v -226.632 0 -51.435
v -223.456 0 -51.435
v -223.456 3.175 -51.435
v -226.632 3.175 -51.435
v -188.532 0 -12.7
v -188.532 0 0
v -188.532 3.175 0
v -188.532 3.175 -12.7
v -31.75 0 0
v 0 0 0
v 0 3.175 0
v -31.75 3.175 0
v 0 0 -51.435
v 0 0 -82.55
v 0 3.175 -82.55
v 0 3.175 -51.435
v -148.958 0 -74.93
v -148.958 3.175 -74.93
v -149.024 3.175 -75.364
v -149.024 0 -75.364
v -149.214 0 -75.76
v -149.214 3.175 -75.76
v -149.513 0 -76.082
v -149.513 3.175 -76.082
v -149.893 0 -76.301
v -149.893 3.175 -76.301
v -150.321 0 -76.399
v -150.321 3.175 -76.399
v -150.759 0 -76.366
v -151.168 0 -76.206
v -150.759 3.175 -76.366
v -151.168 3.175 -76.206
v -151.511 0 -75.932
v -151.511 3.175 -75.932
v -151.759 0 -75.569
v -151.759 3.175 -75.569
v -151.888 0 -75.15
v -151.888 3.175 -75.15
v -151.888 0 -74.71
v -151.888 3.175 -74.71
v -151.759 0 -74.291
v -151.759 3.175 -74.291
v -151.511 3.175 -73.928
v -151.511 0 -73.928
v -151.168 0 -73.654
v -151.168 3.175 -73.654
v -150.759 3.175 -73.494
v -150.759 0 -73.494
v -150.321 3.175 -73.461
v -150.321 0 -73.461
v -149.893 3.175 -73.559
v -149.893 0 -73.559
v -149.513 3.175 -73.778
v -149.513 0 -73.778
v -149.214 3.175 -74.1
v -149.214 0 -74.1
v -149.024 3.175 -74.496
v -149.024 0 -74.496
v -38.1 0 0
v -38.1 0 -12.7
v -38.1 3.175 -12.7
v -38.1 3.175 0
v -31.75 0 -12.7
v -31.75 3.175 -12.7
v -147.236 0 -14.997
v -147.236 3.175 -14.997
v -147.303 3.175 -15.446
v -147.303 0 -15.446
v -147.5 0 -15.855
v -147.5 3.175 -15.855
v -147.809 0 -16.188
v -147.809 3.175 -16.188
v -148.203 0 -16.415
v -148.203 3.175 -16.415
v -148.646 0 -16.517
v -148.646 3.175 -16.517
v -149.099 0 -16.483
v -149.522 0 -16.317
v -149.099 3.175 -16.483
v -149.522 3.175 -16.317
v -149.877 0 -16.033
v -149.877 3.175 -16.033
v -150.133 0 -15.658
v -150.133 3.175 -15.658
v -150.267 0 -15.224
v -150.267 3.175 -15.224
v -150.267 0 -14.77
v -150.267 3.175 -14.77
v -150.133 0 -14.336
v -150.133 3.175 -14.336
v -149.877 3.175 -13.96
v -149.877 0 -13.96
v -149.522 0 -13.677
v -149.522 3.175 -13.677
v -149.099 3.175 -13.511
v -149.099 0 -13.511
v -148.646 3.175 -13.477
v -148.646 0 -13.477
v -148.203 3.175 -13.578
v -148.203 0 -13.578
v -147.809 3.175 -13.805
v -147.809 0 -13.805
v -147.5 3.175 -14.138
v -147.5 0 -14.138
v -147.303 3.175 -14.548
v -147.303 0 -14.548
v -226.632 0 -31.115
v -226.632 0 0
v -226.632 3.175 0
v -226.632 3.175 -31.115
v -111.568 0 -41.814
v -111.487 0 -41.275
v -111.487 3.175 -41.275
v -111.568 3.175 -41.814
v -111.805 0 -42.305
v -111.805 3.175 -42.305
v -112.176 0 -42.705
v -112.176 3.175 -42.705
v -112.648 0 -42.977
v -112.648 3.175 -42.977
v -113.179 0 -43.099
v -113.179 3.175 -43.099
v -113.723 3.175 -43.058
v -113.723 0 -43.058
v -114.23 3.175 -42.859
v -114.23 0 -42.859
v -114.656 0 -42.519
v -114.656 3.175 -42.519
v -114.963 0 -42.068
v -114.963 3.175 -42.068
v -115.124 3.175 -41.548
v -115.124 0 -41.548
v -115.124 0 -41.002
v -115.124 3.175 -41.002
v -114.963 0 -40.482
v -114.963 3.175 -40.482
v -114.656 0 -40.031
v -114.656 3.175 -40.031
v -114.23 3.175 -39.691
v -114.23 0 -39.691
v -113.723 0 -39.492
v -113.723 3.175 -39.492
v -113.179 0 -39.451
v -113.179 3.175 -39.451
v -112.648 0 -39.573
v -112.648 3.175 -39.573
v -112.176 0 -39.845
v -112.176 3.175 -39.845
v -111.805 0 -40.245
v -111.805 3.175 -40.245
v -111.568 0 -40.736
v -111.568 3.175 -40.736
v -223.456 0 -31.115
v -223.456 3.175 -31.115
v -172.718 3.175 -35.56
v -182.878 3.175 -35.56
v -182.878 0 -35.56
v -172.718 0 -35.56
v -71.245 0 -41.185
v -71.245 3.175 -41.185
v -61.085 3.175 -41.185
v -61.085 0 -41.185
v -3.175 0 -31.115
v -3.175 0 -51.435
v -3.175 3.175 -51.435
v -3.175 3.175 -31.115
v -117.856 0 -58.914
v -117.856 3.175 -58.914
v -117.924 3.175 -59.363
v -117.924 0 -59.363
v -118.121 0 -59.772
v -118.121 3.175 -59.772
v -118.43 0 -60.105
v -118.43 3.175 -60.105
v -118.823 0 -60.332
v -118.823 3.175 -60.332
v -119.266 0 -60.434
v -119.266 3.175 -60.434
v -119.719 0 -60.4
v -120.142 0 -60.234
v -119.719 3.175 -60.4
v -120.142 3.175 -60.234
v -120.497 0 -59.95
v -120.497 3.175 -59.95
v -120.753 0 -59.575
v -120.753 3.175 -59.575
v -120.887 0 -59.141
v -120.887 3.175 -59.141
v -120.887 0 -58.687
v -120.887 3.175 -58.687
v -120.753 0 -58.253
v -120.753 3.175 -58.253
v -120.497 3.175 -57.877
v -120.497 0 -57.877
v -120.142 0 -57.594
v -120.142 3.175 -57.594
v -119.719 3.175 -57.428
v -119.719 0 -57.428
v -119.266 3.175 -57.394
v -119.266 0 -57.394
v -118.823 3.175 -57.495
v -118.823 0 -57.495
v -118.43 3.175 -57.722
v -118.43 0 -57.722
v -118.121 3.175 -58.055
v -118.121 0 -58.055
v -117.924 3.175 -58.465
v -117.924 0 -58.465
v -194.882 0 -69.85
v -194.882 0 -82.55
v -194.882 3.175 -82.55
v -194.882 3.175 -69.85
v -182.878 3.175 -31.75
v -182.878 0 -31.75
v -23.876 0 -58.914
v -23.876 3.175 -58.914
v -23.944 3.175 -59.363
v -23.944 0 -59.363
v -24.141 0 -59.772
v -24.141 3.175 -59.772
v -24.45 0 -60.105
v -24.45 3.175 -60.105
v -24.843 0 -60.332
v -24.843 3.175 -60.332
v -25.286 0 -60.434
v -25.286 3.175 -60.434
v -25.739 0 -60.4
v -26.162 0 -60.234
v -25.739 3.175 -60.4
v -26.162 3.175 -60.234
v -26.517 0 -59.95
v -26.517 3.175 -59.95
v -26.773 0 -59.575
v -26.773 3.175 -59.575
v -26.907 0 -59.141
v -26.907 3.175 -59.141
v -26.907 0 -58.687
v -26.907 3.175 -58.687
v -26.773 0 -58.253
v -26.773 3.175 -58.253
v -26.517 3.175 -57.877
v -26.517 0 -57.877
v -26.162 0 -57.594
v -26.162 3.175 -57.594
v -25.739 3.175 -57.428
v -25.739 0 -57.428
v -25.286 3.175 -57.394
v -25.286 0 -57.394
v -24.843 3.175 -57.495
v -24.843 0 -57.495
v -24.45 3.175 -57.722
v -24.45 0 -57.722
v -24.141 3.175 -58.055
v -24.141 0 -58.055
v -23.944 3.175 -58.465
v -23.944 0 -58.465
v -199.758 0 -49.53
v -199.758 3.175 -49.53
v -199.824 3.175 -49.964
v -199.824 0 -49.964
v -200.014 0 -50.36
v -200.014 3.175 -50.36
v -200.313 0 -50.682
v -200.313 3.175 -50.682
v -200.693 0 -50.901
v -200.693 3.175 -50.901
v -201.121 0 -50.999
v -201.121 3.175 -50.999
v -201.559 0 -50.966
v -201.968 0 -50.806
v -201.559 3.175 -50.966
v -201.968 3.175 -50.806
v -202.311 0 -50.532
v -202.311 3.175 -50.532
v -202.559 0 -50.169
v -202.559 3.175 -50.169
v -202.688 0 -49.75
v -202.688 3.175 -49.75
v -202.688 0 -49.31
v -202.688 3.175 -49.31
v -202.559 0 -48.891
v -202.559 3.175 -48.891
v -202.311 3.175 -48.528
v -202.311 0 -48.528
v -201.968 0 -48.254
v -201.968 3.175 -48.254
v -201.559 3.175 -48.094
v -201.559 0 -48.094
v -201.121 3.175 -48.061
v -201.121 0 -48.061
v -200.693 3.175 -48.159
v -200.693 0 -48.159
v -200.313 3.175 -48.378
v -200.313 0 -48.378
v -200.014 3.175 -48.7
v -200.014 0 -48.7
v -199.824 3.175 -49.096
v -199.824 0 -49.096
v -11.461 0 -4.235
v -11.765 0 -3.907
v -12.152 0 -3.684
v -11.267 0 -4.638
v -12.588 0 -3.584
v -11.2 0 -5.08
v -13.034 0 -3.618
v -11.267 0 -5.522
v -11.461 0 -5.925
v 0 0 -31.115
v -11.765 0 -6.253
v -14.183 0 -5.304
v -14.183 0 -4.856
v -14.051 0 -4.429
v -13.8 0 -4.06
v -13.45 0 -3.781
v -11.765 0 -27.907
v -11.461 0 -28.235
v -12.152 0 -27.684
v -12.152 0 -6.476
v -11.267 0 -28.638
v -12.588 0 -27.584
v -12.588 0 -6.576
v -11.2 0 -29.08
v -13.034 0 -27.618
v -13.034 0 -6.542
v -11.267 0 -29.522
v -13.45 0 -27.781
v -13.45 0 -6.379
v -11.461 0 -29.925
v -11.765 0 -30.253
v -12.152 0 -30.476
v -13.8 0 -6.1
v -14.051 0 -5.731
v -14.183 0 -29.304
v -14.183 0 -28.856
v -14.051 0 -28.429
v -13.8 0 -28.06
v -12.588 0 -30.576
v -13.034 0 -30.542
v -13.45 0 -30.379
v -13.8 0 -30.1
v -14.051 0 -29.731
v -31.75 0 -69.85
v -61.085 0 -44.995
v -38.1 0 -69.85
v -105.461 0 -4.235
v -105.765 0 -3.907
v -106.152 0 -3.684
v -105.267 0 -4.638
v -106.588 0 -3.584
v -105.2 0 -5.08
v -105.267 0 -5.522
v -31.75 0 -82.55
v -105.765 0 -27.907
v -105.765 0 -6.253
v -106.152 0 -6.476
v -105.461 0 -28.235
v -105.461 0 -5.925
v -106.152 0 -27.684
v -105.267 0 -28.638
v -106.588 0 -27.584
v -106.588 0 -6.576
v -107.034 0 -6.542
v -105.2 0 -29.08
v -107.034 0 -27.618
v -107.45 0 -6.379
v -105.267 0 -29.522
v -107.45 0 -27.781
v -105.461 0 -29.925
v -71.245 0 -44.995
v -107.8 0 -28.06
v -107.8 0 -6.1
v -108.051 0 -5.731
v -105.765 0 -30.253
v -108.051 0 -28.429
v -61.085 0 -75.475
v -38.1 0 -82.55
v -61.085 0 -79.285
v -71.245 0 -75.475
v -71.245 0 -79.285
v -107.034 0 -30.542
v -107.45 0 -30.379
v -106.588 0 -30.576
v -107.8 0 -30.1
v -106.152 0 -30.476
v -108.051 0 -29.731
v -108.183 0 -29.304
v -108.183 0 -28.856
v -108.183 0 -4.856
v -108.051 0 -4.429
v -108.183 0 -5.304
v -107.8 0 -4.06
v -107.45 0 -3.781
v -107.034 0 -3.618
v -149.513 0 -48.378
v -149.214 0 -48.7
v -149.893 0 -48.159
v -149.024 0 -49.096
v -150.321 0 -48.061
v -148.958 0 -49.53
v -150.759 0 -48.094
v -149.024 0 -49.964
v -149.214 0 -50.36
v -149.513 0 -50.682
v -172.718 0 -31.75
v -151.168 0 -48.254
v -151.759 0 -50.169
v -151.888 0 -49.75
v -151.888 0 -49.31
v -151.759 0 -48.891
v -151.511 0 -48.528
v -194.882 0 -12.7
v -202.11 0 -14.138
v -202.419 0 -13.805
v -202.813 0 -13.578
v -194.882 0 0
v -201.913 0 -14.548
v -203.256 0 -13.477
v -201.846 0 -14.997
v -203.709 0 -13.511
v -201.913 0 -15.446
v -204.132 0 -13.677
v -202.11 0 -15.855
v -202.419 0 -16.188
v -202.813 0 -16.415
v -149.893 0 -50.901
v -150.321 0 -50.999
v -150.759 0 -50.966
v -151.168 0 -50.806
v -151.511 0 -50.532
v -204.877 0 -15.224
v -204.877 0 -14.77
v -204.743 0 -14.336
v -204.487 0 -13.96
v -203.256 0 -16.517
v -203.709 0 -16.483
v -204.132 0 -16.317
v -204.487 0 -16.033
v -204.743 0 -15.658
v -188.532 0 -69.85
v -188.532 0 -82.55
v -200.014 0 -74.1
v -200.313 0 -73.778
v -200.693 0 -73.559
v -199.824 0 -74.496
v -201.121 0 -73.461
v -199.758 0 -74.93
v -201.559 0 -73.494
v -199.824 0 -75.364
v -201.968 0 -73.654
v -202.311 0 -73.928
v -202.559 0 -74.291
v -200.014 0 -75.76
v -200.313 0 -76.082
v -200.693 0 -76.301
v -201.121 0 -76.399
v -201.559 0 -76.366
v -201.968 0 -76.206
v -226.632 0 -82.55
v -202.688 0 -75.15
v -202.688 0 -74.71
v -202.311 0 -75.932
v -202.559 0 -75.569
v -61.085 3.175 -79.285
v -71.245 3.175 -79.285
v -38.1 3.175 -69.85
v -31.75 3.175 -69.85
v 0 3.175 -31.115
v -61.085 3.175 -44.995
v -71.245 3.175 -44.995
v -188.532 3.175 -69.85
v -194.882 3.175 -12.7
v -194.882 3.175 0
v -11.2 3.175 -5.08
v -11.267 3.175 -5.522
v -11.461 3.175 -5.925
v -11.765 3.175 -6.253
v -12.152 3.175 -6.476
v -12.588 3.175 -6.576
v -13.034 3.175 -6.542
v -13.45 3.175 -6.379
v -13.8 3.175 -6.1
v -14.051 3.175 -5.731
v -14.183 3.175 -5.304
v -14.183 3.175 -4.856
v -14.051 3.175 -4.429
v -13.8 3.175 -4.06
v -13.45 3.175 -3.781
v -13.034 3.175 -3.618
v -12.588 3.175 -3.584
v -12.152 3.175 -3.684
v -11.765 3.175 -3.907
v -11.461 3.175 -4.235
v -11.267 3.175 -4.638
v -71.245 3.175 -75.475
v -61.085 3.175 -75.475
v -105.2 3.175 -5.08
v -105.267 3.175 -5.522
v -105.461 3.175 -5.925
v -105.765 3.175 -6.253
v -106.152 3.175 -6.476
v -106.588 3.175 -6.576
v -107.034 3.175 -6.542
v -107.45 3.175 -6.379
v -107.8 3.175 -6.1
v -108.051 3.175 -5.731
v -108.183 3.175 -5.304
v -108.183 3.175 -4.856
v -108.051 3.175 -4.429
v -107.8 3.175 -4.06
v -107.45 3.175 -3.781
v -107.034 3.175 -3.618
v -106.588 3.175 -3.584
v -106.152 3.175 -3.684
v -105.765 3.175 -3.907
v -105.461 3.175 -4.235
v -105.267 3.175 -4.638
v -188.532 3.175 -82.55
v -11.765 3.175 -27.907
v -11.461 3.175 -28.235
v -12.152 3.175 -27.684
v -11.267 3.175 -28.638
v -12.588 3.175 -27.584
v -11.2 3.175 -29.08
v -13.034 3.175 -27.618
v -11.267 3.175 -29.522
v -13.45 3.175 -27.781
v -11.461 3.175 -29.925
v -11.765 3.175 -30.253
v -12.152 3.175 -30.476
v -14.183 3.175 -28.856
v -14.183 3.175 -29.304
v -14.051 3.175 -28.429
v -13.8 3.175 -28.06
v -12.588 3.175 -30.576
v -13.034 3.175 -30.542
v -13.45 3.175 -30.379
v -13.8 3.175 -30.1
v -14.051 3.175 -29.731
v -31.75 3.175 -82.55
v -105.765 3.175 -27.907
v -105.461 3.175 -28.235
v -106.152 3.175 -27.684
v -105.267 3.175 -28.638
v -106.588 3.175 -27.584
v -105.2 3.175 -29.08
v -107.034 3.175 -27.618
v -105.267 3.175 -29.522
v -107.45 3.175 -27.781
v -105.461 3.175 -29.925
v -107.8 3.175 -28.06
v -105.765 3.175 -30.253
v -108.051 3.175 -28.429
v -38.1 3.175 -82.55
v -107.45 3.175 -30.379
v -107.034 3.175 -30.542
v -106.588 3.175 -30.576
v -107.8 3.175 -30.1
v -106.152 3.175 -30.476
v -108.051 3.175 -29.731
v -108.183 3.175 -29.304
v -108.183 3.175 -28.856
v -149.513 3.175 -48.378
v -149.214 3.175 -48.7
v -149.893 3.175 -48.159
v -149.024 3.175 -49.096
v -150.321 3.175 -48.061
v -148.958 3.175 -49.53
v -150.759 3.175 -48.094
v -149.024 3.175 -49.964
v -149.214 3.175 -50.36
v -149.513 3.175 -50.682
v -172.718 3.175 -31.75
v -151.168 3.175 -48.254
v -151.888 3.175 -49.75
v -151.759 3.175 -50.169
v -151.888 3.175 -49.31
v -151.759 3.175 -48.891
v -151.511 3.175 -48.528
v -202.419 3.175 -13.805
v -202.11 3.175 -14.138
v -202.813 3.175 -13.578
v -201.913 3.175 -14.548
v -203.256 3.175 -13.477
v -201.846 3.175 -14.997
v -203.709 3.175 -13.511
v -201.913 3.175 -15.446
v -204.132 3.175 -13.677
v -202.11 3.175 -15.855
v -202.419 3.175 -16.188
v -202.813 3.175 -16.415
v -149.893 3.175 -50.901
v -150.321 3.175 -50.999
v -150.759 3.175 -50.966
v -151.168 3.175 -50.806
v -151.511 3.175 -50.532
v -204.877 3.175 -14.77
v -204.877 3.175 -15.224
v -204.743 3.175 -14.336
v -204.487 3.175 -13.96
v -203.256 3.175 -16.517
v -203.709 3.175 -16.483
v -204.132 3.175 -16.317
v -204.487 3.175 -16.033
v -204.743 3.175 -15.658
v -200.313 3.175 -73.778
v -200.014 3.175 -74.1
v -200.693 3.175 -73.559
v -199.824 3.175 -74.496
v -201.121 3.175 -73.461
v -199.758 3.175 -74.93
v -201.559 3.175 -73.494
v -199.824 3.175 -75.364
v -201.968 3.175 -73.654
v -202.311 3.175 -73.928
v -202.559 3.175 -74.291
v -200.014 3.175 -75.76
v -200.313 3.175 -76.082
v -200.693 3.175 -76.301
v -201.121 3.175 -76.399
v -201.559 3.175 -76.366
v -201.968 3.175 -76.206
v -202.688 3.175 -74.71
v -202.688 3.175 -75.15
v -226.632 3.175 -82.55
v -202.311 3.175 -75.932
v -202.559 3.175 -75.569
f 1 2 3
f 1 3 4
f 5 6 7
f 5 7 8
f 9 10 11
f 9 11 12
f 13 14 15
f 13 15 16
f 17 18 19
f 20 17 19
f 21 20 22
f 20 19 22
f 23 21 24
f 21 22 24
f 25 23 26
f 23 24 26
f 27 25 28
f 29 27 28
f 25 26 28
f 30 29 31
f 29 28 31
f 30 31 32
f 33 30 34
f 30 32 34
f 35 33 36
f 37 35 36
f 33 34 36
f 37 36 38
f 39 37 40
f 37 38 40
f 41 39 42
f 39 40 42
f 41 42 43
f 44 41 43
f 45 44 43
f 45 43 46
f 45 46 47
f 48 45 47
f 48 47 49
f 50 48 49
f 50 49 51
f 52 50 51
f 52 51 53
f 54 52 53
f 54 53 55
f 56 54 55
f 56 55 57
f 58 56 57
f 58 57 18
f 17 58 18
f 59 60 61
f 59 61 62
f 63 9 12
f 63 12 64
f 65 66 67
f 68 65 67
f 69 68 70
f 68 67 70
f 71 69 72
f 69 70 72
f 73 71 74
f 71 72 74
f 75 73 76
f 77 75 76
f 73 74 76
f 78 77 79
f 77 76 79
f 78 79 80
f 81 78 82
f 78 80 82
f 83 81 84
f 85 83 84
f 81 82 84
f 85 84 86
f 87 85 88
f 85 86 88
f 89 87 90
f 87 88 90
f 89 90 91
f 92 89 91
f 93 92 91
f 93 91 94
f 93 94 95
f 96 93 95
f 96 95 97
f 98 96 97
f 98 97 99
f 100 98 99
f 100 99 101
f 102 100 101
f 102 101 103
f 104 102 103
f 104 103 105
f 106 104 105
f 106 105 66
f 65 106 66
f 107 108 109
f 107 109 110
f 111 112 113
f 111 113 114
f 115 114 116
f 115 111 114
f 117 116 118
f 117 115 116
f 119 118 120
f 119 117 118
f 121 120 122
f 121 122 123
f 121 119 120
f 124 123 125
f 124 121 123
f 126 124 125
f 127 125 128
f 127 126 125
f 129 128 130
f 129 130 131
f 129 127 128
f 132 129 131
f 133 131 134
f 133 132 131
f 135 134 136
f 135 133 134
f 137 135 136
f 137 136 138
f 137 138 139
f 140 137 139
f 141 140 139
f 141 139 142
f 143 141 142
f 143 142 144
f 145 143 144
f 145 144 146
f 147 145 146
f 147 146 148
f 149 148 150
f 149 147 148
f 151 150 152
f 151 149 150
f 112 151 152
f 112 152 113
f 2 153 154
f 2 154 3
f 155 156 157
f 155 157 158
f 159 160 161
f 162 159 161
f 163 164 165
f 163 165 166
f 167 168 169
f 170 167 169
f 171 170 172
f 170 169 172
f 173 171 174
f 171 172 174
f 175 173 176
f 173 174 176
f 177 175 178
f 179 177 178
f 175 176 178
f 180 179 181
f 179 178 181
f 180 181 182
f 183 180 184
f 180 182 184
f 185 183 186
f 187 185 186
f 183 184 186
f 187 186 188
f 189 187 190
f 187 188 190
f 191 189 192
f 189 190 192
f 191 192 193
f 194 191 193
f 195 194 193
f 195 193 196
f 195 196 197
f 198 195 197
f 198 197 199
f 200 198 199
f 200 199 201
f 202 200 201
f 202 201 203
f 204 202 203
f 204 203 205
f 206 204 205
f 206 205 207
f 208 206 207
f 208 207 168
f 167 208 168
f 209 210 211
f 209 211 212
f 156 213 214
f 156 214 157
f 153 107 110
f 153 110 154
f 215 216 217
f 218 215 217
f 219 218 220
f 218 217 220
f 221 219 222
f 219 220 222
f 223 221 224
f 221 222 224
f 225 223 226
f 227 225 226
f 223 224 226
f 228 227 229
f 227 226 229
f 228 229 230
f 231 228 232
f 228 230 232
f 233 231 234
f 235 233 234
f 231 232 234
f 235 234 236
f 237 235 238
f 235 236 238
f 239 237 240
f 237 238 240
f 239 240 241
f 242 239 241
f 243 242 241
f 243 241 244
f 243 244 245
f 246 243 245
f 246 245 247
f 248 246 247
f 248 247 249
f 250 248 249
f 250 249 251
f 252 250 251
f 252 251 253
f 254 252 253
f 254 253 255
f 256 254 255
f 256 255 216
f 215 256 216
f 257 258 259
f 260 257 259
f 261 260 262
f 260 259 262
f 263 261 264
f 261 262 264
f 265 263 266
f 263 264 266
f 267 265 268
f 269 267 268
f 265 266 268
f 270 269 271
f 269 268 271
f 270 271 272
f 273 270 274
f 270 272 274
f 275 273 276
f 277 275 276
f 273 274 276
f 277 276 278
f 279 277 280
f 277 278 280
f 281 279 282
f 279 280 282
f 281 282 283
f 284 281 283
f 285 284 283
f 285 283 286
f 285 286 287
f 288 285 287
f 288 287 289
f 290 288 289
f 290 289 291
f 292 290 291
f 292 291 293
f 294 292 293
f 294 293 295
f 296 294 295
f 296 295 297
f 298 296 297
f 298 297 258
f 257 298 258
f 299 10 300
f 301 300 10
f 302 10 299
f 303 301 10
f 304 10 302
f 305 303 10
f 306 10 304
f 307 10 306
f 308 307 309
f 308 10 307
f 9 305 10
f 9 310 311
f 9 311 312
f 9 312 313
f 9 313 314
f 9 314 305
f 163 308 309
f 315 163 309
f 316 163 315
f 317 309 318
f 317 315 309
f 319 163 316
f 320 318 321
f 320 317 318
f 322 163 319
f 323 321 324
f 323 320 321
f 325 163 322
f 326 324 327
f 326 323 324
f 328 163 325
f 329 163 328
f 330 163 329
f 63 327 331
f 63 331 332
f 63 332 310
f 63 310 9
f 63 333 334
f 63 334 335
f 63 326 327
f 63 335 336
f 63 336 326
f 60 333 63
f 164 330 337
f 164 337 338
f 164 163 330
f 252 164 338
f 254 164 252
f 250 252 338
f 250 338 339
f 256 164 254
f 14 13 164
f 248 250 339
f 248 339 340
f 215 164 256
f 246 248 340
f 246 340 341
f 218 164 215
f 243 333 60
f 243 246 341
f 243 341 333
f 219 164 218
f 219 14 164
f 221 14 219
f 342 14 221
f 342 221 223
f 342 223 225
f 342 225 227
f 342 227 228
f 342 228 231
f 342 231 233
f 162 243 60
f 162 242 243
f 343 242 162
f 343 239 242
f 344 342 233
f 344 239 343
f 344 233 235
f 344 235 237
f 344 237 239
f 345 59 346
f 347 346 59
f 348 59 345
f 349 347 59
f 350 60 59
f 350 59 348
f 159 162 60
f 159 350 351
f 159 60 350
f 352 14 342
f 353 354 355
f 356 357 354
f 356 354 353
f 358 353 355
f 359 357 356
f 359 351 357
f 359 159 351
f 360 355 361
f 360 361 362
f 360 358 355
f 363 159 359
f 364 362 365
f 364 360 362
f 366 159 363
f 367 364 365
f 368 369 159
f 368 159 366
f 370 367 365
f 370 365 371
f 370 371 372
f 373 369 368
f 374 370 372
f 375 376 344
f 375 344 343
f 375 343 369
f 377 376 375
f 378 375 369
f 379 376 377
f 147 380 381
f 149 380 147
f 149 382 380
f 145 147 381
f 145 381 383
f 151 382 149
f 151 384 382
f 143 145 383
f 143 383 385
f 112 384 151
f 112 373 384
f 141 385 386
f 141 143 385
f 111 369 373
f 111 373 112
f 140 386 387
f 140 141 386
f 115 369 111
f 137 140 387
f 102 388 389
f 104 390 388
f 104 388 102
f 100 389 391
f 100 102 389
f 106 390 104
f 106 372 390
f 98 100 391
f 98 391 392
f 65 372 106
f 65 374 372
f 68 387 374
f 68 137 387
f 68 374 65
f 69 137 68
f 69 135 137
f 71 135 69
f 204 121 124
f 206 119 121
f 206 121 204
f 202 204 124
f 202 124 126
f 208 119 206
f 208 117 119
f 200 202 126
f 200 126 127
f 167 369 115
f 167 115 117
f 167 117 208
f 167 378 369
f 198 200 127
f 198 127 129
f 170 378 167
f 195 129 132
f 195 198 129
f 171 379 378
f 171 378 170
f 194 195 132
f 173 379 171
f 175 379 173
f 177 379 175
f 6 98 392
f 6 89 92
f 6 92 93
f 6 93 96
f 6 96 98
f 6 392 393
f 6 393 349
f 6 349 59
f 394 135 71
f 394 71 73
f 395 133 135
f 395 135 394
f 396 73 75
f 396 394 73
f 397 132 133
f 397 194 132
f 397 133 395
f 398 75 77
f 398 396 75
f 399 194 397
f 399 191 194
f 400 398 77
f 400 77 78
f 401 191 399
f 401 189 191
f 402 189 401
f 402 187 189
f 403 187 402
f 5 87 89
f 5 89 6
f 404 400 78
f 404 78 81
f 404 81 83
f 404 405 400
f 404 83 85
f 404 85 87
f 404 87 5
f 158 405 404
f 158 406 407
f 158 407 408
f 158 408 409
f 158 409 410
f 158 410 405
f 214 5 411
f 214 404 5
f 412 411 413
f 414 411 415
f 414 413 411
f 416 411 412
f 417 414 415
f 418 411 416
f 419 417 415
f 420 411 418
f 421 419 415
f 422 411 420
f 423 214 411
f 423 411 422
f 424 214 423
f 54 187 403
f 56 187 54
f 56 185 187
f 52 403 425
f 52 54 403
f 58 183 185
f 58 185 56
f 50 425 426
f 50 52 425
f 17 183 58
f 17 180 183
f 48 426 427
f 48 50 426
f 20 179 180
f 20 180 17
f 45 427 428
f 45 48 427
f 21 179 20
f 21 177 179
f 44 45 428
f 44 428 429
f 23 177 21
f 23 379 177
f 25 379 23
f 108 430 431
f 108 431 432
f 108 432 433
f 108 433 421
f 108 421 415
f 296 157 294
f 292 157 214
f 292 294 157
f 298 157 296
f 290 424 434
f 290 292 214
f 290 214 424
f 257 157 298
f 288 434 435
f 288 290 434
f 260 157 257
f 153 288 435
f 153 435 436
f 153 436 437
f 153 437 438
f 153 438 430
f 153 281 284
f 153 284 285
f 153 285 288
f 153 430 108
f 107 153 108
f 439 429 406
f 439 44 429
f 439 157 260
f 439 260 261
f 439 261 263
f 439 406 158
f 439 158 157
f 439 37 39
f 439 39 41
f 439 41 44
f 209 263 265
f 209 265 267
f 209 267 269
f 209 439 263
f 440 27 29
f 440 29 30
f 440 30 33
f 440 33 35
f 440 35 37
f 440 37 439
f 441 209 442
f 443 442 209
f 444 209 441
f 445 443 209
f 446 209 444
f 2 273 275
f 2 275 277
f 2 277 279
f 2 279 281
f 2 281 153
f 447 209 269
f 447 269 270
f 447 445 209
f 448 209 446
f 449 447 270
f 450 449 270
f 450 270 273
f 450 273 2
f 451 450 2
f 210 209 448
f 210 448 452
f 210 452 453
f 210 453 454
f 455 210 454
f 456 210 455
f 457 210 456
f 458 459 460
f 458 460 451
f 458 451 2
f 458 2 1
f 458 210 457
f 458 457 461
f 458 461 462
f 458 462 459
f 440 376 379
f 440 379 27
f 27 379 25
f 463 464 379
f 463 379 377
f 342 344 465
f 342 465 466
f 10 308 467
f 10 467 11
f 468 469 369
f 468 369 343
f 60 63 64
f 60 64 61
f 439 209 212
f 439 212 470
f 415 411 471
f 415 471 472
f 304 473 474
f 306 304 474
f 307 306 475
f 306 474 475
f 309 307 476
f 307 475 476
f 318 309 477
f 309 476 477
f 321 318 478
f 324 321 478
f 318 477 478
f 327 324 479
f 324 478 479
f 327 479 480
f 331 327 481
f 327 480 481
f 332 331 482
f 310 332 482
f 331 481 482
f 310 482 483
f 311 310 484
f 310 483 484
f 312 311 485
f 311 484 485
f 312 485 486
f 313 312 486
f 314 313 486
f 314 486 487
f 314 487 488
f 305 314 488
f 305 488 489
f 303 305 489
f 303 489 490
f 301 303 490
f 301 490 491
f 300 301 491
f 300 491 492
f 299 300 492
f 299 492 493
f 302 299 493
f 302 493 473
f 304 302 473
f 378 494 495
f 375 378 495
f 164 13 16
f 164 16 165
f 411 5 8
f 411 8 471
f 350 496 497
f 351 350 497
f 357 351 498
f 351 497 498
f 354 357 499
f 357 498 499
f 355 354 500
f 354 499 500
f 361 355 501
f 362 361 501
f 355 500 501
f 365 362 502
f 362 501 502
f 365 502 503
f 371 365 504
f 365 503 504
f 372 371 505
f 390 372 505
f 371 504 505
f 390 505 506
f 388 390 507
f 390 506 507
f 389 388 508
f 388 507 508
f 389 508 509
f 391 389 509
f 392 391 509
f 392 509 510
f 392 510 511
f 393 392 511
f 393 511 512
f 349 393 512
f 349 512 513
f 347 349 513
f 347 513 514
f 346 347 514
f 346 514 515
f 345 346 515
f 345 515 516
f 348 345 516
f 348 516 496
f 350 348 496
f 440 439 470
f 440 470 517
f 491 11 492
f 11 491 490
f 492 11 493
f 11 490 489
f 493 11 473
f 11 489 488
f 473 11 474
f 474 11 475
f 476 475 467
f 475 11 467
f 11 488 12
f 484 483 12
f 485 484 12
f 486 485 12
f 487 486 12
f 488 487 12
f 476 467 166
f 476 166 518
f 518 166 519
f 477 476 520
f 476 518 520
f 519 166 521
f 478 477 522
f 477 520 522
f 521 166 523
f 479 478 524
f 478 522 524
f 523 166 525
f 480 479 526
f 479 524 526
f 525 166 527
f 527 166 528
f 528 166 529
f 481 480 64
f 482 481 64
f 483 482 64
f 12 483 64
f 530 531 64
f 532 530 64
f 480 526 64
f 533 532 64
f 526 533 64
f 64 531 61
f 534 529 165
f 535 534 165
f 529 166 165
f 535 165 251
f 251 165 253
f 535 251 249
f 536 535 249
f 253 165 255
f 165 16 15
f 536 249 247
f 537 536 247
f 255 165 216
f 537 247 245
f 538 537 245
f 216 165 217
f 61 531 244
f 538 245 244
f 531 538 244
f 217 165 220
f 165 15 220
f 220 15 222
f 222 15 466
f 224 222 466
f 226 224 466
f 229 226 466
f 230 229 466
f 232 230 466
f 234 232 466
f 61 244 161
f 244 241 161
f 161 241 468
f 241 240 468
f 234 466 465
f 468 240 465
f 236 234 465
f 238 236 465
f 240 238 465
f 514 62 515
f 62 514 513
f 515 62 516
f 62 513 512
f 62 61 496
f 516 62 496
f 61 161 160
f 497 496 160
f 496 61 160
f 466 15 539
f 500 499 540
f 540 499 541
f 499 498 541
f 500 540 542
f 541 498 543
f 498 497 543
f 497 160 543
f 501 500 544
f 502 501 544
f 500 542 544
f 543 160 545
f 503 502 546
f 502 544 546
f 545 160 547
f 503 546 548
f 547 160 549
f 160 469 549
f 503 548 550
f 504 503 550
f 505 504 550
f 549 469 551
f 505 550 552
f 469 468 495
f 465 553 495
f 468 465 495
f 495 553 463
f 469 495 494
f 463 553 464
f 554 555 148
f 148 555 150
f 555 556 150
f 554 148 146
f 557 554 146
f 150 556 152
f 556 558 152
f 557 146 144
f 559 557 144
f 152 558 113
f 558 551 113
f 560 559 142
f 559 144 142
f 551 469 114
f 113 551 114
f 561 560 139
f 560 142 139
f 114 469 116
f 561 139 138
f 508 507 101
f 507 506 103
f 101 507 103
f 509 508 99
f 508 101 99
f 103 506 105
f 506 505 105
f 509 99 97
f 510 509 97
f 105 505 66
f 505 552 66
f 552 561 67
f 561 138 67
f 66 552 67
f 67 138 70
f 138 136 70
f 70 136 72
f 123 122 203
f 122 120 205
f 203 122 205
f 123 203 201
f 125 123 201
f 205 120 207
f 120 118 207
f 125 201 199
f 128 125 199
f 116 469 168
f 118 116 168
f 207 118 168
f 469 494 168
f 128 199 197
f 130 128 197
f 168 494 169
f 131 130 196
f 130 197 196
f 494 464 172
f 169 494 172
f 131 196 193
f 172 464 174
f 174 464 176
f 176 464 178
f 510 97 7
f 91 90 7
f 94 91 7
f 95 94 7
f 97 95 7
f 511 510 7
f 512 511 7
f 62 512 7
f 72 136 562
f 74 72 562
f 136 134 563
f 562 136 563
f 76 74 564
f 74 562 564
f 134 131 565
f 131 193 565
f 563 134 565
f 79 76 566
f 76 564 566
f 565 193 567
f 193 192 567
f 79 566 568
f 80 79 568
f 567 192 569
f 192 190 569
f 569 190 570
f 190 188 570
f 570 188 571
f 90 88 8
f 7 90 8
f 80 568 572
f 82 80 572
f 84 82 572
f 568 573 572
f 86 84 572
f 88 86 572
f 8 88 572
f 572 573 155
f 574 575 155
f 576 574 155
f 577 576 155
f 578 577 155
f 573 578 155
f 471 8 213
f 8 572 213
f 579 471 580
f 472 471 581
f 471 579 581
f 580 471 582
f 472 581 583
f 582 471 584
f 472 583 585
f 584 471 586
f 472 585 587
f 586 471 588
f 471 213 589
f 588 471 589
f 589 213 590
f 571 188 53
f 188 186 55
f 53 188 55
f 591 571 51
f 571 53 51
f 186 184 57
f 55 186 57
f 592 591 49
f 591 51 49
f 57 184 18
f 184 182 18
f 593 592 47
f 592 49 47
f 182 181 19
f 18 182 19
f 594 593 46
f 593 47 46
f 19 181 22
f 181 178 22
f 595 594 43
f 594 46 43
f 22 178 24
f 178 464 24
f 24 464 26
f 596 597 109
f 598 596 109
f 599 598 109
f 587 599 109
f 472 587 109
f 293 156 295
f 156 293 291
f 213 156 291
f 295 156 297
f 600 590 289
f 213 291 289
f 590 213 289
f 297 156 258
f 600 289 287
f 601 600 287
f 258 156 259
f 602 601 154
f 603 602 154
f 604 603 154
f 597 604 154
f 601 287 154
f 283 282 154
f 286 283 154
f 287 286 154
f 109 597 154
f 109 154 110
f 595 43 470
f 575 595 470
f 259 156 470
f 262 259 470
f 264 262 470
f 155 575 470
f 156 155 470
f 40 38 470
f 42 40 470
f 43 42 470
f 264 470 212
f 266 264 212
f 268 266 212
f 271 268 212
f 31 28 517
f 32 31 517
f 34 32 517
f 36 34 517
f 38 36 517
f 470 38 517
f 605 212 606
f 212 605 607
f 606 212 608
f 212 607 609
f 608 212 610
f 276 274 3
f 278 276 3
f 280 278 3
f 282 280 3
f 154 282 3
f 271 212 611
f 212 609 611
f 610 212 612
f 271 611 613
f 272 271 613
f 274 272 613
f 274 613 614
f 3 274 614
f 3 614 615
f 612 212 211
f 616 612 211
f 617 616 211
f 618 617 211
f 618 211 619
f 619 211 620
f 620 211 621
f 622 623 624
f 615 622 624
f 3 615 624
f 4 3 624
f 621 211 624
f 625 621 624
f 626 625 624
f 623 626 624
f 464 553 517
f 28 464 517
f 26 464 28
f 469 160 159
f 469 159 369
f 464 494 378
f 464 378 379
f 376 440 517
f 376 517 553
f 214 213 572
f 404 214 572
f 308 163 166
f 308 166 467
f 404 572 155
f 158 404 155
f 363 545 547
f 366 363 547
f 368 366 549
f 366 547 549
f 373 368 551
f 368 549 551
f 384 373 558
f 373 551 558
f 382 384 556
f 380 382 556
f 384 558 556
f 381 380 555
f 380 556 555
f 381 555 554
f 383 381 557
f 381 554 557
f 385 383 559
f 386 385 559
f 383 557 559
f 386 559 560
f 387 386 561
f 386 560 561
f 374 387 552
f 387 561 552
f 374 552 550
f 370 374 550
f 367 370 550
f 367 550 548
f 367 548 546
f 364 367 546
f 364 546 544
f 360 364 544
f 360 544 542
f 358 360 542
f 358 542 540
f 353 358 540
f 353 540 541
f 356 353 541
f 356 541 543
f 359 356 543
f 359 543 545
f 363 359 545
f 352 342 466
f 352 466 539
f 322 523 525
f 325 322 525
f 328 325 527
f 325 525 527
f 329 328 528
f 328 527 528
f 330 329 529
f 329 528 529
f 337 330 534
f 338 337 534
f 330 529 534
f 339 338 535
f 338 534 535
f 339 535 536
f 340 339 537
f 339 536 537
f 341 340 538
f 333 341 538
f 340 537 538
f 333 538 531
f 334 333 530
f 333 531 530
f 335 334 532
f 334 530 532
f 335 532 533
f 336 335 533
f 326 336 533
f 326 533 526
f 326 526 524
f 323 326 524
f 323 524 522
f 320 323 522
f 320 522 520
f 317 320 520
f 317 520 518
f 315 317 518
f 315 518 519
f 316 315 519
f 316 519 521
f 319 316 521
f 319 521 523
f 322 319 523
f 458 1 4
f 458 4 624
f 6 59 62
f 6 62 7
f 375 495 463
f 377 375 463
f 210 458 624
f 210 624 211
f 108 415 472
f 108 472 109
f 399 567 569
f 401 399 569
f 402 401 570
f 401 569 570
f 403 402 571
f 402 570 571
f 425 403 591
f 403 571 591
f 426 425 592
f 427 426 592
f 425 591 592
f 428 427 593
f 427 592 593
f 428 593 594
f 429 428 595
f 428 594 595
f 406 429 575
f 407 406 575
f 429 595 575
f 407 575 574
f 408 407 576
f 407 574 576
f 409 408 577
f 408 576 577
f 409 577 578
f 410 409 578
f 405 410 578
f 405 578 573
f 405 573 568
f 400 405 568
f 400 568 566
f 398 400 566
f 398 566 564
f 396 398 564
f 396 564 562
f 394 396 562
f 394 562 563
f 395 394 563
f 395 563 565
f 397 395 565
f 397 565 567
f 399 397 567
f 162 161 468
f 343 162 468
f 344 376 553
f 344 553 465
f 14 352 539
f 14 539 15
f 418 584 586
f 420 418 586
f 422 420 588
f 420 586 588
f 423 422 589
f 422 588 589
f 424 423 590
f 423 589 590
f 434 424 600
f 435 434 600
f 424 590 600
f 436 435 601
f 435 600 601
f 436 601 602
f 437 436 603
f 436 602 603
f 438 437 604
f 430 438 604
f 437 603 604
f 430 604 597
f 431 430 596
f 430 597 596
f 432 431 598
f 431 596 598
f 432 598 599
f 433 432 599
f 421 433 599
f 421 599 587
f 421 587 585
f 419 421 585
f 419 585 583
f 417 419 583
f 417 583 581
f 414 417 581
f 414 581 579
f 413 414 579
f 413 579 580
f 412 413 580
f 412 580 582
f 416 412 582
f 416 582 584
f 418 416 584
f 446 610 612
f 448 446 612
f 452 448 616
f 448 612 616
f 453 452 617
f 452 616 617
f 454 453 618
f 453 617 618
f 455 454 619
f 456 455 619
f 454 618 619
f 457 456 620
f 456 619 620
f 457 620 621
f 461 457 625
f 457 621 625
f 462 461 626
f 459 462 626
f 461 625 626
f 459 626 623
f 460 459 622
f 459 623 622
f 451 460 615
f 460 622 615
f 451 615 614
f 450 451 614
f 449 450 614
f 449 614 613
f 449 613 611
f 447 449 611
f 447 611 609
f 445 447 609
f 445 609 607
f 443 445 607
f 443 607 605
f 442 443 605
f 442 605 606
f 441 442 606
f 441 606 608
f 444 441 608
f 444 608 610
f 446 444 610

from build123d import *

# Parameters (mm, degrees)
SKETCH1_R           = 1.8288
BOSS_EXTRUDE1_DEPTH = 3.175
SKETCH3_R           = 1.5
CUT_EXTRUDE1_DEPTH  = 4.175
SKETCH4_R           = 1.4732
CUT_EXTRUDE2_DEPTH  = 4.175
SKETCH5_R           = 1.524
SKETCH5_W           = 10.16
SKETCH5_H           = 3.81
CUT_EXTRUDE3_DEPTH  = 4.175


with BuildPart() as part:
    # Sketch1 → Boss-Extrude1 (new body)
    with BuildSketch(Plane(origin=(0, 0, 0), x_dir=(1, 0, 0), z_dir=(0, 1, 0))):
        Polygon((-226.6315, 82.55), (-194.8815, 82.55), (-194.8815, 69.85), (-188.5315, 69.85), (-188.5315, 82.55), (-38.1, 82.55), (-38.1, 69.85), (-31.75, 69.85), (-31.75, 82.55), (0, 82.55), (0, 51.435), (-3.175, 51.435), (-3.175, 31.115), (0, 31.115), (0, 0), (-31.75, 0), (-31.75, 12.7), (-38.1, 12.7), (-38.1, 0), (-188.5315, 0), (-188.5315, 12.7), (-194.8815, 12.7), (-194.8815, 0), (-226.6315, 0), (-226.6315, 31.115), (-223.4565, 31.115), (-223.4565, 51.435), (-226.6315, 51.435), align=None)
        with Locations((-113.31575, 41.275)):
            Circle(SKETCH1_R, mode=Mode.SUBTRACT)
    extrude(amount=BOSS_EXTRUDE1_DEPTH)

    # Sketch3 → Cut-Extrude1 (cut, through all)
    with BuildSketch(Plane(origin=(0, 3.175, 0), x_dir=(1, 0, 0), z_dir=(0, 1, 0))):
        with Locations((-106.7, 29.08)):
            Circle(SKETCH3_R)
        with Locations((-106.7, 5.08)):
            Circle(SKETCH3_R)
        with Locations((-12.7, 5.08)):
            Circle(SKETCH3_R)
        with Locations((-12.7, 29.08)):
            Circle(SKETCH3_R)
    extrude(amount=-CUT_EXTRUDE1_DEPTH, mode=Mode.SUBTRACT)

    # Sketch4 → Cut-Extrude2 (cut, through all)
    with BuildSketch(Plane(origin=(0, 3.175, 0), x_dir=(1, 0, 0), z_dir=(0, 1, 0))):
        with Locations((-150.4315, 49.53)):
            Circle(SKETCH4_R)
        with Locations((-150.4315, 74.93)):
            Circle(SKETCH4_R)
        with Locations((-201.2315, 74.93)):
            Circle(SKETCH4_R)
        with Locations((-201.2315, 49.53)):
            Circle(SKETCH4_R)
    extrude(amount=-CUT_EXTRUDE2_DEPTH, mode=Mode.SUBTRACT)

    # Sketch5 → Cut-Extrude3 (cut, through all)
    with BuildSketch(Plane(origin=(0, 3.175, 0), x_dir=(1, 0, 0), z_dir=(0, 1, 0))):
        with Locations((-203.369556456, 14.996771974)):
            Circle(SKETCH5_R)
        with Locations((-148.759556456, 14.996771974)):
            Circle(SKETCH5_R)
        with Locations((-25.4, 58.913810593)):
            Circle(SKETCH5_R)
        with Locations((-119.38, 58.913810593)):
            Circle(SKETCH5_R)
        with Locations((-177.797598384, 33.655)):
            Rectangle(SKETCH5_W, SKETCH5_H)
        with Locations((-66.164783375, 43.089749173)):
            Rectangle(SKETCH5_W, SKETCH5_H)
        with Locations((-66.164783375, 77.379749173)):
            Rectangle(SKETCH5_W, SKETCH5_H)
    extrude(amount=-CUT_EXTRUDE3_DEPTH, mode=Mode.SUBTRACT)


solid = part.part
